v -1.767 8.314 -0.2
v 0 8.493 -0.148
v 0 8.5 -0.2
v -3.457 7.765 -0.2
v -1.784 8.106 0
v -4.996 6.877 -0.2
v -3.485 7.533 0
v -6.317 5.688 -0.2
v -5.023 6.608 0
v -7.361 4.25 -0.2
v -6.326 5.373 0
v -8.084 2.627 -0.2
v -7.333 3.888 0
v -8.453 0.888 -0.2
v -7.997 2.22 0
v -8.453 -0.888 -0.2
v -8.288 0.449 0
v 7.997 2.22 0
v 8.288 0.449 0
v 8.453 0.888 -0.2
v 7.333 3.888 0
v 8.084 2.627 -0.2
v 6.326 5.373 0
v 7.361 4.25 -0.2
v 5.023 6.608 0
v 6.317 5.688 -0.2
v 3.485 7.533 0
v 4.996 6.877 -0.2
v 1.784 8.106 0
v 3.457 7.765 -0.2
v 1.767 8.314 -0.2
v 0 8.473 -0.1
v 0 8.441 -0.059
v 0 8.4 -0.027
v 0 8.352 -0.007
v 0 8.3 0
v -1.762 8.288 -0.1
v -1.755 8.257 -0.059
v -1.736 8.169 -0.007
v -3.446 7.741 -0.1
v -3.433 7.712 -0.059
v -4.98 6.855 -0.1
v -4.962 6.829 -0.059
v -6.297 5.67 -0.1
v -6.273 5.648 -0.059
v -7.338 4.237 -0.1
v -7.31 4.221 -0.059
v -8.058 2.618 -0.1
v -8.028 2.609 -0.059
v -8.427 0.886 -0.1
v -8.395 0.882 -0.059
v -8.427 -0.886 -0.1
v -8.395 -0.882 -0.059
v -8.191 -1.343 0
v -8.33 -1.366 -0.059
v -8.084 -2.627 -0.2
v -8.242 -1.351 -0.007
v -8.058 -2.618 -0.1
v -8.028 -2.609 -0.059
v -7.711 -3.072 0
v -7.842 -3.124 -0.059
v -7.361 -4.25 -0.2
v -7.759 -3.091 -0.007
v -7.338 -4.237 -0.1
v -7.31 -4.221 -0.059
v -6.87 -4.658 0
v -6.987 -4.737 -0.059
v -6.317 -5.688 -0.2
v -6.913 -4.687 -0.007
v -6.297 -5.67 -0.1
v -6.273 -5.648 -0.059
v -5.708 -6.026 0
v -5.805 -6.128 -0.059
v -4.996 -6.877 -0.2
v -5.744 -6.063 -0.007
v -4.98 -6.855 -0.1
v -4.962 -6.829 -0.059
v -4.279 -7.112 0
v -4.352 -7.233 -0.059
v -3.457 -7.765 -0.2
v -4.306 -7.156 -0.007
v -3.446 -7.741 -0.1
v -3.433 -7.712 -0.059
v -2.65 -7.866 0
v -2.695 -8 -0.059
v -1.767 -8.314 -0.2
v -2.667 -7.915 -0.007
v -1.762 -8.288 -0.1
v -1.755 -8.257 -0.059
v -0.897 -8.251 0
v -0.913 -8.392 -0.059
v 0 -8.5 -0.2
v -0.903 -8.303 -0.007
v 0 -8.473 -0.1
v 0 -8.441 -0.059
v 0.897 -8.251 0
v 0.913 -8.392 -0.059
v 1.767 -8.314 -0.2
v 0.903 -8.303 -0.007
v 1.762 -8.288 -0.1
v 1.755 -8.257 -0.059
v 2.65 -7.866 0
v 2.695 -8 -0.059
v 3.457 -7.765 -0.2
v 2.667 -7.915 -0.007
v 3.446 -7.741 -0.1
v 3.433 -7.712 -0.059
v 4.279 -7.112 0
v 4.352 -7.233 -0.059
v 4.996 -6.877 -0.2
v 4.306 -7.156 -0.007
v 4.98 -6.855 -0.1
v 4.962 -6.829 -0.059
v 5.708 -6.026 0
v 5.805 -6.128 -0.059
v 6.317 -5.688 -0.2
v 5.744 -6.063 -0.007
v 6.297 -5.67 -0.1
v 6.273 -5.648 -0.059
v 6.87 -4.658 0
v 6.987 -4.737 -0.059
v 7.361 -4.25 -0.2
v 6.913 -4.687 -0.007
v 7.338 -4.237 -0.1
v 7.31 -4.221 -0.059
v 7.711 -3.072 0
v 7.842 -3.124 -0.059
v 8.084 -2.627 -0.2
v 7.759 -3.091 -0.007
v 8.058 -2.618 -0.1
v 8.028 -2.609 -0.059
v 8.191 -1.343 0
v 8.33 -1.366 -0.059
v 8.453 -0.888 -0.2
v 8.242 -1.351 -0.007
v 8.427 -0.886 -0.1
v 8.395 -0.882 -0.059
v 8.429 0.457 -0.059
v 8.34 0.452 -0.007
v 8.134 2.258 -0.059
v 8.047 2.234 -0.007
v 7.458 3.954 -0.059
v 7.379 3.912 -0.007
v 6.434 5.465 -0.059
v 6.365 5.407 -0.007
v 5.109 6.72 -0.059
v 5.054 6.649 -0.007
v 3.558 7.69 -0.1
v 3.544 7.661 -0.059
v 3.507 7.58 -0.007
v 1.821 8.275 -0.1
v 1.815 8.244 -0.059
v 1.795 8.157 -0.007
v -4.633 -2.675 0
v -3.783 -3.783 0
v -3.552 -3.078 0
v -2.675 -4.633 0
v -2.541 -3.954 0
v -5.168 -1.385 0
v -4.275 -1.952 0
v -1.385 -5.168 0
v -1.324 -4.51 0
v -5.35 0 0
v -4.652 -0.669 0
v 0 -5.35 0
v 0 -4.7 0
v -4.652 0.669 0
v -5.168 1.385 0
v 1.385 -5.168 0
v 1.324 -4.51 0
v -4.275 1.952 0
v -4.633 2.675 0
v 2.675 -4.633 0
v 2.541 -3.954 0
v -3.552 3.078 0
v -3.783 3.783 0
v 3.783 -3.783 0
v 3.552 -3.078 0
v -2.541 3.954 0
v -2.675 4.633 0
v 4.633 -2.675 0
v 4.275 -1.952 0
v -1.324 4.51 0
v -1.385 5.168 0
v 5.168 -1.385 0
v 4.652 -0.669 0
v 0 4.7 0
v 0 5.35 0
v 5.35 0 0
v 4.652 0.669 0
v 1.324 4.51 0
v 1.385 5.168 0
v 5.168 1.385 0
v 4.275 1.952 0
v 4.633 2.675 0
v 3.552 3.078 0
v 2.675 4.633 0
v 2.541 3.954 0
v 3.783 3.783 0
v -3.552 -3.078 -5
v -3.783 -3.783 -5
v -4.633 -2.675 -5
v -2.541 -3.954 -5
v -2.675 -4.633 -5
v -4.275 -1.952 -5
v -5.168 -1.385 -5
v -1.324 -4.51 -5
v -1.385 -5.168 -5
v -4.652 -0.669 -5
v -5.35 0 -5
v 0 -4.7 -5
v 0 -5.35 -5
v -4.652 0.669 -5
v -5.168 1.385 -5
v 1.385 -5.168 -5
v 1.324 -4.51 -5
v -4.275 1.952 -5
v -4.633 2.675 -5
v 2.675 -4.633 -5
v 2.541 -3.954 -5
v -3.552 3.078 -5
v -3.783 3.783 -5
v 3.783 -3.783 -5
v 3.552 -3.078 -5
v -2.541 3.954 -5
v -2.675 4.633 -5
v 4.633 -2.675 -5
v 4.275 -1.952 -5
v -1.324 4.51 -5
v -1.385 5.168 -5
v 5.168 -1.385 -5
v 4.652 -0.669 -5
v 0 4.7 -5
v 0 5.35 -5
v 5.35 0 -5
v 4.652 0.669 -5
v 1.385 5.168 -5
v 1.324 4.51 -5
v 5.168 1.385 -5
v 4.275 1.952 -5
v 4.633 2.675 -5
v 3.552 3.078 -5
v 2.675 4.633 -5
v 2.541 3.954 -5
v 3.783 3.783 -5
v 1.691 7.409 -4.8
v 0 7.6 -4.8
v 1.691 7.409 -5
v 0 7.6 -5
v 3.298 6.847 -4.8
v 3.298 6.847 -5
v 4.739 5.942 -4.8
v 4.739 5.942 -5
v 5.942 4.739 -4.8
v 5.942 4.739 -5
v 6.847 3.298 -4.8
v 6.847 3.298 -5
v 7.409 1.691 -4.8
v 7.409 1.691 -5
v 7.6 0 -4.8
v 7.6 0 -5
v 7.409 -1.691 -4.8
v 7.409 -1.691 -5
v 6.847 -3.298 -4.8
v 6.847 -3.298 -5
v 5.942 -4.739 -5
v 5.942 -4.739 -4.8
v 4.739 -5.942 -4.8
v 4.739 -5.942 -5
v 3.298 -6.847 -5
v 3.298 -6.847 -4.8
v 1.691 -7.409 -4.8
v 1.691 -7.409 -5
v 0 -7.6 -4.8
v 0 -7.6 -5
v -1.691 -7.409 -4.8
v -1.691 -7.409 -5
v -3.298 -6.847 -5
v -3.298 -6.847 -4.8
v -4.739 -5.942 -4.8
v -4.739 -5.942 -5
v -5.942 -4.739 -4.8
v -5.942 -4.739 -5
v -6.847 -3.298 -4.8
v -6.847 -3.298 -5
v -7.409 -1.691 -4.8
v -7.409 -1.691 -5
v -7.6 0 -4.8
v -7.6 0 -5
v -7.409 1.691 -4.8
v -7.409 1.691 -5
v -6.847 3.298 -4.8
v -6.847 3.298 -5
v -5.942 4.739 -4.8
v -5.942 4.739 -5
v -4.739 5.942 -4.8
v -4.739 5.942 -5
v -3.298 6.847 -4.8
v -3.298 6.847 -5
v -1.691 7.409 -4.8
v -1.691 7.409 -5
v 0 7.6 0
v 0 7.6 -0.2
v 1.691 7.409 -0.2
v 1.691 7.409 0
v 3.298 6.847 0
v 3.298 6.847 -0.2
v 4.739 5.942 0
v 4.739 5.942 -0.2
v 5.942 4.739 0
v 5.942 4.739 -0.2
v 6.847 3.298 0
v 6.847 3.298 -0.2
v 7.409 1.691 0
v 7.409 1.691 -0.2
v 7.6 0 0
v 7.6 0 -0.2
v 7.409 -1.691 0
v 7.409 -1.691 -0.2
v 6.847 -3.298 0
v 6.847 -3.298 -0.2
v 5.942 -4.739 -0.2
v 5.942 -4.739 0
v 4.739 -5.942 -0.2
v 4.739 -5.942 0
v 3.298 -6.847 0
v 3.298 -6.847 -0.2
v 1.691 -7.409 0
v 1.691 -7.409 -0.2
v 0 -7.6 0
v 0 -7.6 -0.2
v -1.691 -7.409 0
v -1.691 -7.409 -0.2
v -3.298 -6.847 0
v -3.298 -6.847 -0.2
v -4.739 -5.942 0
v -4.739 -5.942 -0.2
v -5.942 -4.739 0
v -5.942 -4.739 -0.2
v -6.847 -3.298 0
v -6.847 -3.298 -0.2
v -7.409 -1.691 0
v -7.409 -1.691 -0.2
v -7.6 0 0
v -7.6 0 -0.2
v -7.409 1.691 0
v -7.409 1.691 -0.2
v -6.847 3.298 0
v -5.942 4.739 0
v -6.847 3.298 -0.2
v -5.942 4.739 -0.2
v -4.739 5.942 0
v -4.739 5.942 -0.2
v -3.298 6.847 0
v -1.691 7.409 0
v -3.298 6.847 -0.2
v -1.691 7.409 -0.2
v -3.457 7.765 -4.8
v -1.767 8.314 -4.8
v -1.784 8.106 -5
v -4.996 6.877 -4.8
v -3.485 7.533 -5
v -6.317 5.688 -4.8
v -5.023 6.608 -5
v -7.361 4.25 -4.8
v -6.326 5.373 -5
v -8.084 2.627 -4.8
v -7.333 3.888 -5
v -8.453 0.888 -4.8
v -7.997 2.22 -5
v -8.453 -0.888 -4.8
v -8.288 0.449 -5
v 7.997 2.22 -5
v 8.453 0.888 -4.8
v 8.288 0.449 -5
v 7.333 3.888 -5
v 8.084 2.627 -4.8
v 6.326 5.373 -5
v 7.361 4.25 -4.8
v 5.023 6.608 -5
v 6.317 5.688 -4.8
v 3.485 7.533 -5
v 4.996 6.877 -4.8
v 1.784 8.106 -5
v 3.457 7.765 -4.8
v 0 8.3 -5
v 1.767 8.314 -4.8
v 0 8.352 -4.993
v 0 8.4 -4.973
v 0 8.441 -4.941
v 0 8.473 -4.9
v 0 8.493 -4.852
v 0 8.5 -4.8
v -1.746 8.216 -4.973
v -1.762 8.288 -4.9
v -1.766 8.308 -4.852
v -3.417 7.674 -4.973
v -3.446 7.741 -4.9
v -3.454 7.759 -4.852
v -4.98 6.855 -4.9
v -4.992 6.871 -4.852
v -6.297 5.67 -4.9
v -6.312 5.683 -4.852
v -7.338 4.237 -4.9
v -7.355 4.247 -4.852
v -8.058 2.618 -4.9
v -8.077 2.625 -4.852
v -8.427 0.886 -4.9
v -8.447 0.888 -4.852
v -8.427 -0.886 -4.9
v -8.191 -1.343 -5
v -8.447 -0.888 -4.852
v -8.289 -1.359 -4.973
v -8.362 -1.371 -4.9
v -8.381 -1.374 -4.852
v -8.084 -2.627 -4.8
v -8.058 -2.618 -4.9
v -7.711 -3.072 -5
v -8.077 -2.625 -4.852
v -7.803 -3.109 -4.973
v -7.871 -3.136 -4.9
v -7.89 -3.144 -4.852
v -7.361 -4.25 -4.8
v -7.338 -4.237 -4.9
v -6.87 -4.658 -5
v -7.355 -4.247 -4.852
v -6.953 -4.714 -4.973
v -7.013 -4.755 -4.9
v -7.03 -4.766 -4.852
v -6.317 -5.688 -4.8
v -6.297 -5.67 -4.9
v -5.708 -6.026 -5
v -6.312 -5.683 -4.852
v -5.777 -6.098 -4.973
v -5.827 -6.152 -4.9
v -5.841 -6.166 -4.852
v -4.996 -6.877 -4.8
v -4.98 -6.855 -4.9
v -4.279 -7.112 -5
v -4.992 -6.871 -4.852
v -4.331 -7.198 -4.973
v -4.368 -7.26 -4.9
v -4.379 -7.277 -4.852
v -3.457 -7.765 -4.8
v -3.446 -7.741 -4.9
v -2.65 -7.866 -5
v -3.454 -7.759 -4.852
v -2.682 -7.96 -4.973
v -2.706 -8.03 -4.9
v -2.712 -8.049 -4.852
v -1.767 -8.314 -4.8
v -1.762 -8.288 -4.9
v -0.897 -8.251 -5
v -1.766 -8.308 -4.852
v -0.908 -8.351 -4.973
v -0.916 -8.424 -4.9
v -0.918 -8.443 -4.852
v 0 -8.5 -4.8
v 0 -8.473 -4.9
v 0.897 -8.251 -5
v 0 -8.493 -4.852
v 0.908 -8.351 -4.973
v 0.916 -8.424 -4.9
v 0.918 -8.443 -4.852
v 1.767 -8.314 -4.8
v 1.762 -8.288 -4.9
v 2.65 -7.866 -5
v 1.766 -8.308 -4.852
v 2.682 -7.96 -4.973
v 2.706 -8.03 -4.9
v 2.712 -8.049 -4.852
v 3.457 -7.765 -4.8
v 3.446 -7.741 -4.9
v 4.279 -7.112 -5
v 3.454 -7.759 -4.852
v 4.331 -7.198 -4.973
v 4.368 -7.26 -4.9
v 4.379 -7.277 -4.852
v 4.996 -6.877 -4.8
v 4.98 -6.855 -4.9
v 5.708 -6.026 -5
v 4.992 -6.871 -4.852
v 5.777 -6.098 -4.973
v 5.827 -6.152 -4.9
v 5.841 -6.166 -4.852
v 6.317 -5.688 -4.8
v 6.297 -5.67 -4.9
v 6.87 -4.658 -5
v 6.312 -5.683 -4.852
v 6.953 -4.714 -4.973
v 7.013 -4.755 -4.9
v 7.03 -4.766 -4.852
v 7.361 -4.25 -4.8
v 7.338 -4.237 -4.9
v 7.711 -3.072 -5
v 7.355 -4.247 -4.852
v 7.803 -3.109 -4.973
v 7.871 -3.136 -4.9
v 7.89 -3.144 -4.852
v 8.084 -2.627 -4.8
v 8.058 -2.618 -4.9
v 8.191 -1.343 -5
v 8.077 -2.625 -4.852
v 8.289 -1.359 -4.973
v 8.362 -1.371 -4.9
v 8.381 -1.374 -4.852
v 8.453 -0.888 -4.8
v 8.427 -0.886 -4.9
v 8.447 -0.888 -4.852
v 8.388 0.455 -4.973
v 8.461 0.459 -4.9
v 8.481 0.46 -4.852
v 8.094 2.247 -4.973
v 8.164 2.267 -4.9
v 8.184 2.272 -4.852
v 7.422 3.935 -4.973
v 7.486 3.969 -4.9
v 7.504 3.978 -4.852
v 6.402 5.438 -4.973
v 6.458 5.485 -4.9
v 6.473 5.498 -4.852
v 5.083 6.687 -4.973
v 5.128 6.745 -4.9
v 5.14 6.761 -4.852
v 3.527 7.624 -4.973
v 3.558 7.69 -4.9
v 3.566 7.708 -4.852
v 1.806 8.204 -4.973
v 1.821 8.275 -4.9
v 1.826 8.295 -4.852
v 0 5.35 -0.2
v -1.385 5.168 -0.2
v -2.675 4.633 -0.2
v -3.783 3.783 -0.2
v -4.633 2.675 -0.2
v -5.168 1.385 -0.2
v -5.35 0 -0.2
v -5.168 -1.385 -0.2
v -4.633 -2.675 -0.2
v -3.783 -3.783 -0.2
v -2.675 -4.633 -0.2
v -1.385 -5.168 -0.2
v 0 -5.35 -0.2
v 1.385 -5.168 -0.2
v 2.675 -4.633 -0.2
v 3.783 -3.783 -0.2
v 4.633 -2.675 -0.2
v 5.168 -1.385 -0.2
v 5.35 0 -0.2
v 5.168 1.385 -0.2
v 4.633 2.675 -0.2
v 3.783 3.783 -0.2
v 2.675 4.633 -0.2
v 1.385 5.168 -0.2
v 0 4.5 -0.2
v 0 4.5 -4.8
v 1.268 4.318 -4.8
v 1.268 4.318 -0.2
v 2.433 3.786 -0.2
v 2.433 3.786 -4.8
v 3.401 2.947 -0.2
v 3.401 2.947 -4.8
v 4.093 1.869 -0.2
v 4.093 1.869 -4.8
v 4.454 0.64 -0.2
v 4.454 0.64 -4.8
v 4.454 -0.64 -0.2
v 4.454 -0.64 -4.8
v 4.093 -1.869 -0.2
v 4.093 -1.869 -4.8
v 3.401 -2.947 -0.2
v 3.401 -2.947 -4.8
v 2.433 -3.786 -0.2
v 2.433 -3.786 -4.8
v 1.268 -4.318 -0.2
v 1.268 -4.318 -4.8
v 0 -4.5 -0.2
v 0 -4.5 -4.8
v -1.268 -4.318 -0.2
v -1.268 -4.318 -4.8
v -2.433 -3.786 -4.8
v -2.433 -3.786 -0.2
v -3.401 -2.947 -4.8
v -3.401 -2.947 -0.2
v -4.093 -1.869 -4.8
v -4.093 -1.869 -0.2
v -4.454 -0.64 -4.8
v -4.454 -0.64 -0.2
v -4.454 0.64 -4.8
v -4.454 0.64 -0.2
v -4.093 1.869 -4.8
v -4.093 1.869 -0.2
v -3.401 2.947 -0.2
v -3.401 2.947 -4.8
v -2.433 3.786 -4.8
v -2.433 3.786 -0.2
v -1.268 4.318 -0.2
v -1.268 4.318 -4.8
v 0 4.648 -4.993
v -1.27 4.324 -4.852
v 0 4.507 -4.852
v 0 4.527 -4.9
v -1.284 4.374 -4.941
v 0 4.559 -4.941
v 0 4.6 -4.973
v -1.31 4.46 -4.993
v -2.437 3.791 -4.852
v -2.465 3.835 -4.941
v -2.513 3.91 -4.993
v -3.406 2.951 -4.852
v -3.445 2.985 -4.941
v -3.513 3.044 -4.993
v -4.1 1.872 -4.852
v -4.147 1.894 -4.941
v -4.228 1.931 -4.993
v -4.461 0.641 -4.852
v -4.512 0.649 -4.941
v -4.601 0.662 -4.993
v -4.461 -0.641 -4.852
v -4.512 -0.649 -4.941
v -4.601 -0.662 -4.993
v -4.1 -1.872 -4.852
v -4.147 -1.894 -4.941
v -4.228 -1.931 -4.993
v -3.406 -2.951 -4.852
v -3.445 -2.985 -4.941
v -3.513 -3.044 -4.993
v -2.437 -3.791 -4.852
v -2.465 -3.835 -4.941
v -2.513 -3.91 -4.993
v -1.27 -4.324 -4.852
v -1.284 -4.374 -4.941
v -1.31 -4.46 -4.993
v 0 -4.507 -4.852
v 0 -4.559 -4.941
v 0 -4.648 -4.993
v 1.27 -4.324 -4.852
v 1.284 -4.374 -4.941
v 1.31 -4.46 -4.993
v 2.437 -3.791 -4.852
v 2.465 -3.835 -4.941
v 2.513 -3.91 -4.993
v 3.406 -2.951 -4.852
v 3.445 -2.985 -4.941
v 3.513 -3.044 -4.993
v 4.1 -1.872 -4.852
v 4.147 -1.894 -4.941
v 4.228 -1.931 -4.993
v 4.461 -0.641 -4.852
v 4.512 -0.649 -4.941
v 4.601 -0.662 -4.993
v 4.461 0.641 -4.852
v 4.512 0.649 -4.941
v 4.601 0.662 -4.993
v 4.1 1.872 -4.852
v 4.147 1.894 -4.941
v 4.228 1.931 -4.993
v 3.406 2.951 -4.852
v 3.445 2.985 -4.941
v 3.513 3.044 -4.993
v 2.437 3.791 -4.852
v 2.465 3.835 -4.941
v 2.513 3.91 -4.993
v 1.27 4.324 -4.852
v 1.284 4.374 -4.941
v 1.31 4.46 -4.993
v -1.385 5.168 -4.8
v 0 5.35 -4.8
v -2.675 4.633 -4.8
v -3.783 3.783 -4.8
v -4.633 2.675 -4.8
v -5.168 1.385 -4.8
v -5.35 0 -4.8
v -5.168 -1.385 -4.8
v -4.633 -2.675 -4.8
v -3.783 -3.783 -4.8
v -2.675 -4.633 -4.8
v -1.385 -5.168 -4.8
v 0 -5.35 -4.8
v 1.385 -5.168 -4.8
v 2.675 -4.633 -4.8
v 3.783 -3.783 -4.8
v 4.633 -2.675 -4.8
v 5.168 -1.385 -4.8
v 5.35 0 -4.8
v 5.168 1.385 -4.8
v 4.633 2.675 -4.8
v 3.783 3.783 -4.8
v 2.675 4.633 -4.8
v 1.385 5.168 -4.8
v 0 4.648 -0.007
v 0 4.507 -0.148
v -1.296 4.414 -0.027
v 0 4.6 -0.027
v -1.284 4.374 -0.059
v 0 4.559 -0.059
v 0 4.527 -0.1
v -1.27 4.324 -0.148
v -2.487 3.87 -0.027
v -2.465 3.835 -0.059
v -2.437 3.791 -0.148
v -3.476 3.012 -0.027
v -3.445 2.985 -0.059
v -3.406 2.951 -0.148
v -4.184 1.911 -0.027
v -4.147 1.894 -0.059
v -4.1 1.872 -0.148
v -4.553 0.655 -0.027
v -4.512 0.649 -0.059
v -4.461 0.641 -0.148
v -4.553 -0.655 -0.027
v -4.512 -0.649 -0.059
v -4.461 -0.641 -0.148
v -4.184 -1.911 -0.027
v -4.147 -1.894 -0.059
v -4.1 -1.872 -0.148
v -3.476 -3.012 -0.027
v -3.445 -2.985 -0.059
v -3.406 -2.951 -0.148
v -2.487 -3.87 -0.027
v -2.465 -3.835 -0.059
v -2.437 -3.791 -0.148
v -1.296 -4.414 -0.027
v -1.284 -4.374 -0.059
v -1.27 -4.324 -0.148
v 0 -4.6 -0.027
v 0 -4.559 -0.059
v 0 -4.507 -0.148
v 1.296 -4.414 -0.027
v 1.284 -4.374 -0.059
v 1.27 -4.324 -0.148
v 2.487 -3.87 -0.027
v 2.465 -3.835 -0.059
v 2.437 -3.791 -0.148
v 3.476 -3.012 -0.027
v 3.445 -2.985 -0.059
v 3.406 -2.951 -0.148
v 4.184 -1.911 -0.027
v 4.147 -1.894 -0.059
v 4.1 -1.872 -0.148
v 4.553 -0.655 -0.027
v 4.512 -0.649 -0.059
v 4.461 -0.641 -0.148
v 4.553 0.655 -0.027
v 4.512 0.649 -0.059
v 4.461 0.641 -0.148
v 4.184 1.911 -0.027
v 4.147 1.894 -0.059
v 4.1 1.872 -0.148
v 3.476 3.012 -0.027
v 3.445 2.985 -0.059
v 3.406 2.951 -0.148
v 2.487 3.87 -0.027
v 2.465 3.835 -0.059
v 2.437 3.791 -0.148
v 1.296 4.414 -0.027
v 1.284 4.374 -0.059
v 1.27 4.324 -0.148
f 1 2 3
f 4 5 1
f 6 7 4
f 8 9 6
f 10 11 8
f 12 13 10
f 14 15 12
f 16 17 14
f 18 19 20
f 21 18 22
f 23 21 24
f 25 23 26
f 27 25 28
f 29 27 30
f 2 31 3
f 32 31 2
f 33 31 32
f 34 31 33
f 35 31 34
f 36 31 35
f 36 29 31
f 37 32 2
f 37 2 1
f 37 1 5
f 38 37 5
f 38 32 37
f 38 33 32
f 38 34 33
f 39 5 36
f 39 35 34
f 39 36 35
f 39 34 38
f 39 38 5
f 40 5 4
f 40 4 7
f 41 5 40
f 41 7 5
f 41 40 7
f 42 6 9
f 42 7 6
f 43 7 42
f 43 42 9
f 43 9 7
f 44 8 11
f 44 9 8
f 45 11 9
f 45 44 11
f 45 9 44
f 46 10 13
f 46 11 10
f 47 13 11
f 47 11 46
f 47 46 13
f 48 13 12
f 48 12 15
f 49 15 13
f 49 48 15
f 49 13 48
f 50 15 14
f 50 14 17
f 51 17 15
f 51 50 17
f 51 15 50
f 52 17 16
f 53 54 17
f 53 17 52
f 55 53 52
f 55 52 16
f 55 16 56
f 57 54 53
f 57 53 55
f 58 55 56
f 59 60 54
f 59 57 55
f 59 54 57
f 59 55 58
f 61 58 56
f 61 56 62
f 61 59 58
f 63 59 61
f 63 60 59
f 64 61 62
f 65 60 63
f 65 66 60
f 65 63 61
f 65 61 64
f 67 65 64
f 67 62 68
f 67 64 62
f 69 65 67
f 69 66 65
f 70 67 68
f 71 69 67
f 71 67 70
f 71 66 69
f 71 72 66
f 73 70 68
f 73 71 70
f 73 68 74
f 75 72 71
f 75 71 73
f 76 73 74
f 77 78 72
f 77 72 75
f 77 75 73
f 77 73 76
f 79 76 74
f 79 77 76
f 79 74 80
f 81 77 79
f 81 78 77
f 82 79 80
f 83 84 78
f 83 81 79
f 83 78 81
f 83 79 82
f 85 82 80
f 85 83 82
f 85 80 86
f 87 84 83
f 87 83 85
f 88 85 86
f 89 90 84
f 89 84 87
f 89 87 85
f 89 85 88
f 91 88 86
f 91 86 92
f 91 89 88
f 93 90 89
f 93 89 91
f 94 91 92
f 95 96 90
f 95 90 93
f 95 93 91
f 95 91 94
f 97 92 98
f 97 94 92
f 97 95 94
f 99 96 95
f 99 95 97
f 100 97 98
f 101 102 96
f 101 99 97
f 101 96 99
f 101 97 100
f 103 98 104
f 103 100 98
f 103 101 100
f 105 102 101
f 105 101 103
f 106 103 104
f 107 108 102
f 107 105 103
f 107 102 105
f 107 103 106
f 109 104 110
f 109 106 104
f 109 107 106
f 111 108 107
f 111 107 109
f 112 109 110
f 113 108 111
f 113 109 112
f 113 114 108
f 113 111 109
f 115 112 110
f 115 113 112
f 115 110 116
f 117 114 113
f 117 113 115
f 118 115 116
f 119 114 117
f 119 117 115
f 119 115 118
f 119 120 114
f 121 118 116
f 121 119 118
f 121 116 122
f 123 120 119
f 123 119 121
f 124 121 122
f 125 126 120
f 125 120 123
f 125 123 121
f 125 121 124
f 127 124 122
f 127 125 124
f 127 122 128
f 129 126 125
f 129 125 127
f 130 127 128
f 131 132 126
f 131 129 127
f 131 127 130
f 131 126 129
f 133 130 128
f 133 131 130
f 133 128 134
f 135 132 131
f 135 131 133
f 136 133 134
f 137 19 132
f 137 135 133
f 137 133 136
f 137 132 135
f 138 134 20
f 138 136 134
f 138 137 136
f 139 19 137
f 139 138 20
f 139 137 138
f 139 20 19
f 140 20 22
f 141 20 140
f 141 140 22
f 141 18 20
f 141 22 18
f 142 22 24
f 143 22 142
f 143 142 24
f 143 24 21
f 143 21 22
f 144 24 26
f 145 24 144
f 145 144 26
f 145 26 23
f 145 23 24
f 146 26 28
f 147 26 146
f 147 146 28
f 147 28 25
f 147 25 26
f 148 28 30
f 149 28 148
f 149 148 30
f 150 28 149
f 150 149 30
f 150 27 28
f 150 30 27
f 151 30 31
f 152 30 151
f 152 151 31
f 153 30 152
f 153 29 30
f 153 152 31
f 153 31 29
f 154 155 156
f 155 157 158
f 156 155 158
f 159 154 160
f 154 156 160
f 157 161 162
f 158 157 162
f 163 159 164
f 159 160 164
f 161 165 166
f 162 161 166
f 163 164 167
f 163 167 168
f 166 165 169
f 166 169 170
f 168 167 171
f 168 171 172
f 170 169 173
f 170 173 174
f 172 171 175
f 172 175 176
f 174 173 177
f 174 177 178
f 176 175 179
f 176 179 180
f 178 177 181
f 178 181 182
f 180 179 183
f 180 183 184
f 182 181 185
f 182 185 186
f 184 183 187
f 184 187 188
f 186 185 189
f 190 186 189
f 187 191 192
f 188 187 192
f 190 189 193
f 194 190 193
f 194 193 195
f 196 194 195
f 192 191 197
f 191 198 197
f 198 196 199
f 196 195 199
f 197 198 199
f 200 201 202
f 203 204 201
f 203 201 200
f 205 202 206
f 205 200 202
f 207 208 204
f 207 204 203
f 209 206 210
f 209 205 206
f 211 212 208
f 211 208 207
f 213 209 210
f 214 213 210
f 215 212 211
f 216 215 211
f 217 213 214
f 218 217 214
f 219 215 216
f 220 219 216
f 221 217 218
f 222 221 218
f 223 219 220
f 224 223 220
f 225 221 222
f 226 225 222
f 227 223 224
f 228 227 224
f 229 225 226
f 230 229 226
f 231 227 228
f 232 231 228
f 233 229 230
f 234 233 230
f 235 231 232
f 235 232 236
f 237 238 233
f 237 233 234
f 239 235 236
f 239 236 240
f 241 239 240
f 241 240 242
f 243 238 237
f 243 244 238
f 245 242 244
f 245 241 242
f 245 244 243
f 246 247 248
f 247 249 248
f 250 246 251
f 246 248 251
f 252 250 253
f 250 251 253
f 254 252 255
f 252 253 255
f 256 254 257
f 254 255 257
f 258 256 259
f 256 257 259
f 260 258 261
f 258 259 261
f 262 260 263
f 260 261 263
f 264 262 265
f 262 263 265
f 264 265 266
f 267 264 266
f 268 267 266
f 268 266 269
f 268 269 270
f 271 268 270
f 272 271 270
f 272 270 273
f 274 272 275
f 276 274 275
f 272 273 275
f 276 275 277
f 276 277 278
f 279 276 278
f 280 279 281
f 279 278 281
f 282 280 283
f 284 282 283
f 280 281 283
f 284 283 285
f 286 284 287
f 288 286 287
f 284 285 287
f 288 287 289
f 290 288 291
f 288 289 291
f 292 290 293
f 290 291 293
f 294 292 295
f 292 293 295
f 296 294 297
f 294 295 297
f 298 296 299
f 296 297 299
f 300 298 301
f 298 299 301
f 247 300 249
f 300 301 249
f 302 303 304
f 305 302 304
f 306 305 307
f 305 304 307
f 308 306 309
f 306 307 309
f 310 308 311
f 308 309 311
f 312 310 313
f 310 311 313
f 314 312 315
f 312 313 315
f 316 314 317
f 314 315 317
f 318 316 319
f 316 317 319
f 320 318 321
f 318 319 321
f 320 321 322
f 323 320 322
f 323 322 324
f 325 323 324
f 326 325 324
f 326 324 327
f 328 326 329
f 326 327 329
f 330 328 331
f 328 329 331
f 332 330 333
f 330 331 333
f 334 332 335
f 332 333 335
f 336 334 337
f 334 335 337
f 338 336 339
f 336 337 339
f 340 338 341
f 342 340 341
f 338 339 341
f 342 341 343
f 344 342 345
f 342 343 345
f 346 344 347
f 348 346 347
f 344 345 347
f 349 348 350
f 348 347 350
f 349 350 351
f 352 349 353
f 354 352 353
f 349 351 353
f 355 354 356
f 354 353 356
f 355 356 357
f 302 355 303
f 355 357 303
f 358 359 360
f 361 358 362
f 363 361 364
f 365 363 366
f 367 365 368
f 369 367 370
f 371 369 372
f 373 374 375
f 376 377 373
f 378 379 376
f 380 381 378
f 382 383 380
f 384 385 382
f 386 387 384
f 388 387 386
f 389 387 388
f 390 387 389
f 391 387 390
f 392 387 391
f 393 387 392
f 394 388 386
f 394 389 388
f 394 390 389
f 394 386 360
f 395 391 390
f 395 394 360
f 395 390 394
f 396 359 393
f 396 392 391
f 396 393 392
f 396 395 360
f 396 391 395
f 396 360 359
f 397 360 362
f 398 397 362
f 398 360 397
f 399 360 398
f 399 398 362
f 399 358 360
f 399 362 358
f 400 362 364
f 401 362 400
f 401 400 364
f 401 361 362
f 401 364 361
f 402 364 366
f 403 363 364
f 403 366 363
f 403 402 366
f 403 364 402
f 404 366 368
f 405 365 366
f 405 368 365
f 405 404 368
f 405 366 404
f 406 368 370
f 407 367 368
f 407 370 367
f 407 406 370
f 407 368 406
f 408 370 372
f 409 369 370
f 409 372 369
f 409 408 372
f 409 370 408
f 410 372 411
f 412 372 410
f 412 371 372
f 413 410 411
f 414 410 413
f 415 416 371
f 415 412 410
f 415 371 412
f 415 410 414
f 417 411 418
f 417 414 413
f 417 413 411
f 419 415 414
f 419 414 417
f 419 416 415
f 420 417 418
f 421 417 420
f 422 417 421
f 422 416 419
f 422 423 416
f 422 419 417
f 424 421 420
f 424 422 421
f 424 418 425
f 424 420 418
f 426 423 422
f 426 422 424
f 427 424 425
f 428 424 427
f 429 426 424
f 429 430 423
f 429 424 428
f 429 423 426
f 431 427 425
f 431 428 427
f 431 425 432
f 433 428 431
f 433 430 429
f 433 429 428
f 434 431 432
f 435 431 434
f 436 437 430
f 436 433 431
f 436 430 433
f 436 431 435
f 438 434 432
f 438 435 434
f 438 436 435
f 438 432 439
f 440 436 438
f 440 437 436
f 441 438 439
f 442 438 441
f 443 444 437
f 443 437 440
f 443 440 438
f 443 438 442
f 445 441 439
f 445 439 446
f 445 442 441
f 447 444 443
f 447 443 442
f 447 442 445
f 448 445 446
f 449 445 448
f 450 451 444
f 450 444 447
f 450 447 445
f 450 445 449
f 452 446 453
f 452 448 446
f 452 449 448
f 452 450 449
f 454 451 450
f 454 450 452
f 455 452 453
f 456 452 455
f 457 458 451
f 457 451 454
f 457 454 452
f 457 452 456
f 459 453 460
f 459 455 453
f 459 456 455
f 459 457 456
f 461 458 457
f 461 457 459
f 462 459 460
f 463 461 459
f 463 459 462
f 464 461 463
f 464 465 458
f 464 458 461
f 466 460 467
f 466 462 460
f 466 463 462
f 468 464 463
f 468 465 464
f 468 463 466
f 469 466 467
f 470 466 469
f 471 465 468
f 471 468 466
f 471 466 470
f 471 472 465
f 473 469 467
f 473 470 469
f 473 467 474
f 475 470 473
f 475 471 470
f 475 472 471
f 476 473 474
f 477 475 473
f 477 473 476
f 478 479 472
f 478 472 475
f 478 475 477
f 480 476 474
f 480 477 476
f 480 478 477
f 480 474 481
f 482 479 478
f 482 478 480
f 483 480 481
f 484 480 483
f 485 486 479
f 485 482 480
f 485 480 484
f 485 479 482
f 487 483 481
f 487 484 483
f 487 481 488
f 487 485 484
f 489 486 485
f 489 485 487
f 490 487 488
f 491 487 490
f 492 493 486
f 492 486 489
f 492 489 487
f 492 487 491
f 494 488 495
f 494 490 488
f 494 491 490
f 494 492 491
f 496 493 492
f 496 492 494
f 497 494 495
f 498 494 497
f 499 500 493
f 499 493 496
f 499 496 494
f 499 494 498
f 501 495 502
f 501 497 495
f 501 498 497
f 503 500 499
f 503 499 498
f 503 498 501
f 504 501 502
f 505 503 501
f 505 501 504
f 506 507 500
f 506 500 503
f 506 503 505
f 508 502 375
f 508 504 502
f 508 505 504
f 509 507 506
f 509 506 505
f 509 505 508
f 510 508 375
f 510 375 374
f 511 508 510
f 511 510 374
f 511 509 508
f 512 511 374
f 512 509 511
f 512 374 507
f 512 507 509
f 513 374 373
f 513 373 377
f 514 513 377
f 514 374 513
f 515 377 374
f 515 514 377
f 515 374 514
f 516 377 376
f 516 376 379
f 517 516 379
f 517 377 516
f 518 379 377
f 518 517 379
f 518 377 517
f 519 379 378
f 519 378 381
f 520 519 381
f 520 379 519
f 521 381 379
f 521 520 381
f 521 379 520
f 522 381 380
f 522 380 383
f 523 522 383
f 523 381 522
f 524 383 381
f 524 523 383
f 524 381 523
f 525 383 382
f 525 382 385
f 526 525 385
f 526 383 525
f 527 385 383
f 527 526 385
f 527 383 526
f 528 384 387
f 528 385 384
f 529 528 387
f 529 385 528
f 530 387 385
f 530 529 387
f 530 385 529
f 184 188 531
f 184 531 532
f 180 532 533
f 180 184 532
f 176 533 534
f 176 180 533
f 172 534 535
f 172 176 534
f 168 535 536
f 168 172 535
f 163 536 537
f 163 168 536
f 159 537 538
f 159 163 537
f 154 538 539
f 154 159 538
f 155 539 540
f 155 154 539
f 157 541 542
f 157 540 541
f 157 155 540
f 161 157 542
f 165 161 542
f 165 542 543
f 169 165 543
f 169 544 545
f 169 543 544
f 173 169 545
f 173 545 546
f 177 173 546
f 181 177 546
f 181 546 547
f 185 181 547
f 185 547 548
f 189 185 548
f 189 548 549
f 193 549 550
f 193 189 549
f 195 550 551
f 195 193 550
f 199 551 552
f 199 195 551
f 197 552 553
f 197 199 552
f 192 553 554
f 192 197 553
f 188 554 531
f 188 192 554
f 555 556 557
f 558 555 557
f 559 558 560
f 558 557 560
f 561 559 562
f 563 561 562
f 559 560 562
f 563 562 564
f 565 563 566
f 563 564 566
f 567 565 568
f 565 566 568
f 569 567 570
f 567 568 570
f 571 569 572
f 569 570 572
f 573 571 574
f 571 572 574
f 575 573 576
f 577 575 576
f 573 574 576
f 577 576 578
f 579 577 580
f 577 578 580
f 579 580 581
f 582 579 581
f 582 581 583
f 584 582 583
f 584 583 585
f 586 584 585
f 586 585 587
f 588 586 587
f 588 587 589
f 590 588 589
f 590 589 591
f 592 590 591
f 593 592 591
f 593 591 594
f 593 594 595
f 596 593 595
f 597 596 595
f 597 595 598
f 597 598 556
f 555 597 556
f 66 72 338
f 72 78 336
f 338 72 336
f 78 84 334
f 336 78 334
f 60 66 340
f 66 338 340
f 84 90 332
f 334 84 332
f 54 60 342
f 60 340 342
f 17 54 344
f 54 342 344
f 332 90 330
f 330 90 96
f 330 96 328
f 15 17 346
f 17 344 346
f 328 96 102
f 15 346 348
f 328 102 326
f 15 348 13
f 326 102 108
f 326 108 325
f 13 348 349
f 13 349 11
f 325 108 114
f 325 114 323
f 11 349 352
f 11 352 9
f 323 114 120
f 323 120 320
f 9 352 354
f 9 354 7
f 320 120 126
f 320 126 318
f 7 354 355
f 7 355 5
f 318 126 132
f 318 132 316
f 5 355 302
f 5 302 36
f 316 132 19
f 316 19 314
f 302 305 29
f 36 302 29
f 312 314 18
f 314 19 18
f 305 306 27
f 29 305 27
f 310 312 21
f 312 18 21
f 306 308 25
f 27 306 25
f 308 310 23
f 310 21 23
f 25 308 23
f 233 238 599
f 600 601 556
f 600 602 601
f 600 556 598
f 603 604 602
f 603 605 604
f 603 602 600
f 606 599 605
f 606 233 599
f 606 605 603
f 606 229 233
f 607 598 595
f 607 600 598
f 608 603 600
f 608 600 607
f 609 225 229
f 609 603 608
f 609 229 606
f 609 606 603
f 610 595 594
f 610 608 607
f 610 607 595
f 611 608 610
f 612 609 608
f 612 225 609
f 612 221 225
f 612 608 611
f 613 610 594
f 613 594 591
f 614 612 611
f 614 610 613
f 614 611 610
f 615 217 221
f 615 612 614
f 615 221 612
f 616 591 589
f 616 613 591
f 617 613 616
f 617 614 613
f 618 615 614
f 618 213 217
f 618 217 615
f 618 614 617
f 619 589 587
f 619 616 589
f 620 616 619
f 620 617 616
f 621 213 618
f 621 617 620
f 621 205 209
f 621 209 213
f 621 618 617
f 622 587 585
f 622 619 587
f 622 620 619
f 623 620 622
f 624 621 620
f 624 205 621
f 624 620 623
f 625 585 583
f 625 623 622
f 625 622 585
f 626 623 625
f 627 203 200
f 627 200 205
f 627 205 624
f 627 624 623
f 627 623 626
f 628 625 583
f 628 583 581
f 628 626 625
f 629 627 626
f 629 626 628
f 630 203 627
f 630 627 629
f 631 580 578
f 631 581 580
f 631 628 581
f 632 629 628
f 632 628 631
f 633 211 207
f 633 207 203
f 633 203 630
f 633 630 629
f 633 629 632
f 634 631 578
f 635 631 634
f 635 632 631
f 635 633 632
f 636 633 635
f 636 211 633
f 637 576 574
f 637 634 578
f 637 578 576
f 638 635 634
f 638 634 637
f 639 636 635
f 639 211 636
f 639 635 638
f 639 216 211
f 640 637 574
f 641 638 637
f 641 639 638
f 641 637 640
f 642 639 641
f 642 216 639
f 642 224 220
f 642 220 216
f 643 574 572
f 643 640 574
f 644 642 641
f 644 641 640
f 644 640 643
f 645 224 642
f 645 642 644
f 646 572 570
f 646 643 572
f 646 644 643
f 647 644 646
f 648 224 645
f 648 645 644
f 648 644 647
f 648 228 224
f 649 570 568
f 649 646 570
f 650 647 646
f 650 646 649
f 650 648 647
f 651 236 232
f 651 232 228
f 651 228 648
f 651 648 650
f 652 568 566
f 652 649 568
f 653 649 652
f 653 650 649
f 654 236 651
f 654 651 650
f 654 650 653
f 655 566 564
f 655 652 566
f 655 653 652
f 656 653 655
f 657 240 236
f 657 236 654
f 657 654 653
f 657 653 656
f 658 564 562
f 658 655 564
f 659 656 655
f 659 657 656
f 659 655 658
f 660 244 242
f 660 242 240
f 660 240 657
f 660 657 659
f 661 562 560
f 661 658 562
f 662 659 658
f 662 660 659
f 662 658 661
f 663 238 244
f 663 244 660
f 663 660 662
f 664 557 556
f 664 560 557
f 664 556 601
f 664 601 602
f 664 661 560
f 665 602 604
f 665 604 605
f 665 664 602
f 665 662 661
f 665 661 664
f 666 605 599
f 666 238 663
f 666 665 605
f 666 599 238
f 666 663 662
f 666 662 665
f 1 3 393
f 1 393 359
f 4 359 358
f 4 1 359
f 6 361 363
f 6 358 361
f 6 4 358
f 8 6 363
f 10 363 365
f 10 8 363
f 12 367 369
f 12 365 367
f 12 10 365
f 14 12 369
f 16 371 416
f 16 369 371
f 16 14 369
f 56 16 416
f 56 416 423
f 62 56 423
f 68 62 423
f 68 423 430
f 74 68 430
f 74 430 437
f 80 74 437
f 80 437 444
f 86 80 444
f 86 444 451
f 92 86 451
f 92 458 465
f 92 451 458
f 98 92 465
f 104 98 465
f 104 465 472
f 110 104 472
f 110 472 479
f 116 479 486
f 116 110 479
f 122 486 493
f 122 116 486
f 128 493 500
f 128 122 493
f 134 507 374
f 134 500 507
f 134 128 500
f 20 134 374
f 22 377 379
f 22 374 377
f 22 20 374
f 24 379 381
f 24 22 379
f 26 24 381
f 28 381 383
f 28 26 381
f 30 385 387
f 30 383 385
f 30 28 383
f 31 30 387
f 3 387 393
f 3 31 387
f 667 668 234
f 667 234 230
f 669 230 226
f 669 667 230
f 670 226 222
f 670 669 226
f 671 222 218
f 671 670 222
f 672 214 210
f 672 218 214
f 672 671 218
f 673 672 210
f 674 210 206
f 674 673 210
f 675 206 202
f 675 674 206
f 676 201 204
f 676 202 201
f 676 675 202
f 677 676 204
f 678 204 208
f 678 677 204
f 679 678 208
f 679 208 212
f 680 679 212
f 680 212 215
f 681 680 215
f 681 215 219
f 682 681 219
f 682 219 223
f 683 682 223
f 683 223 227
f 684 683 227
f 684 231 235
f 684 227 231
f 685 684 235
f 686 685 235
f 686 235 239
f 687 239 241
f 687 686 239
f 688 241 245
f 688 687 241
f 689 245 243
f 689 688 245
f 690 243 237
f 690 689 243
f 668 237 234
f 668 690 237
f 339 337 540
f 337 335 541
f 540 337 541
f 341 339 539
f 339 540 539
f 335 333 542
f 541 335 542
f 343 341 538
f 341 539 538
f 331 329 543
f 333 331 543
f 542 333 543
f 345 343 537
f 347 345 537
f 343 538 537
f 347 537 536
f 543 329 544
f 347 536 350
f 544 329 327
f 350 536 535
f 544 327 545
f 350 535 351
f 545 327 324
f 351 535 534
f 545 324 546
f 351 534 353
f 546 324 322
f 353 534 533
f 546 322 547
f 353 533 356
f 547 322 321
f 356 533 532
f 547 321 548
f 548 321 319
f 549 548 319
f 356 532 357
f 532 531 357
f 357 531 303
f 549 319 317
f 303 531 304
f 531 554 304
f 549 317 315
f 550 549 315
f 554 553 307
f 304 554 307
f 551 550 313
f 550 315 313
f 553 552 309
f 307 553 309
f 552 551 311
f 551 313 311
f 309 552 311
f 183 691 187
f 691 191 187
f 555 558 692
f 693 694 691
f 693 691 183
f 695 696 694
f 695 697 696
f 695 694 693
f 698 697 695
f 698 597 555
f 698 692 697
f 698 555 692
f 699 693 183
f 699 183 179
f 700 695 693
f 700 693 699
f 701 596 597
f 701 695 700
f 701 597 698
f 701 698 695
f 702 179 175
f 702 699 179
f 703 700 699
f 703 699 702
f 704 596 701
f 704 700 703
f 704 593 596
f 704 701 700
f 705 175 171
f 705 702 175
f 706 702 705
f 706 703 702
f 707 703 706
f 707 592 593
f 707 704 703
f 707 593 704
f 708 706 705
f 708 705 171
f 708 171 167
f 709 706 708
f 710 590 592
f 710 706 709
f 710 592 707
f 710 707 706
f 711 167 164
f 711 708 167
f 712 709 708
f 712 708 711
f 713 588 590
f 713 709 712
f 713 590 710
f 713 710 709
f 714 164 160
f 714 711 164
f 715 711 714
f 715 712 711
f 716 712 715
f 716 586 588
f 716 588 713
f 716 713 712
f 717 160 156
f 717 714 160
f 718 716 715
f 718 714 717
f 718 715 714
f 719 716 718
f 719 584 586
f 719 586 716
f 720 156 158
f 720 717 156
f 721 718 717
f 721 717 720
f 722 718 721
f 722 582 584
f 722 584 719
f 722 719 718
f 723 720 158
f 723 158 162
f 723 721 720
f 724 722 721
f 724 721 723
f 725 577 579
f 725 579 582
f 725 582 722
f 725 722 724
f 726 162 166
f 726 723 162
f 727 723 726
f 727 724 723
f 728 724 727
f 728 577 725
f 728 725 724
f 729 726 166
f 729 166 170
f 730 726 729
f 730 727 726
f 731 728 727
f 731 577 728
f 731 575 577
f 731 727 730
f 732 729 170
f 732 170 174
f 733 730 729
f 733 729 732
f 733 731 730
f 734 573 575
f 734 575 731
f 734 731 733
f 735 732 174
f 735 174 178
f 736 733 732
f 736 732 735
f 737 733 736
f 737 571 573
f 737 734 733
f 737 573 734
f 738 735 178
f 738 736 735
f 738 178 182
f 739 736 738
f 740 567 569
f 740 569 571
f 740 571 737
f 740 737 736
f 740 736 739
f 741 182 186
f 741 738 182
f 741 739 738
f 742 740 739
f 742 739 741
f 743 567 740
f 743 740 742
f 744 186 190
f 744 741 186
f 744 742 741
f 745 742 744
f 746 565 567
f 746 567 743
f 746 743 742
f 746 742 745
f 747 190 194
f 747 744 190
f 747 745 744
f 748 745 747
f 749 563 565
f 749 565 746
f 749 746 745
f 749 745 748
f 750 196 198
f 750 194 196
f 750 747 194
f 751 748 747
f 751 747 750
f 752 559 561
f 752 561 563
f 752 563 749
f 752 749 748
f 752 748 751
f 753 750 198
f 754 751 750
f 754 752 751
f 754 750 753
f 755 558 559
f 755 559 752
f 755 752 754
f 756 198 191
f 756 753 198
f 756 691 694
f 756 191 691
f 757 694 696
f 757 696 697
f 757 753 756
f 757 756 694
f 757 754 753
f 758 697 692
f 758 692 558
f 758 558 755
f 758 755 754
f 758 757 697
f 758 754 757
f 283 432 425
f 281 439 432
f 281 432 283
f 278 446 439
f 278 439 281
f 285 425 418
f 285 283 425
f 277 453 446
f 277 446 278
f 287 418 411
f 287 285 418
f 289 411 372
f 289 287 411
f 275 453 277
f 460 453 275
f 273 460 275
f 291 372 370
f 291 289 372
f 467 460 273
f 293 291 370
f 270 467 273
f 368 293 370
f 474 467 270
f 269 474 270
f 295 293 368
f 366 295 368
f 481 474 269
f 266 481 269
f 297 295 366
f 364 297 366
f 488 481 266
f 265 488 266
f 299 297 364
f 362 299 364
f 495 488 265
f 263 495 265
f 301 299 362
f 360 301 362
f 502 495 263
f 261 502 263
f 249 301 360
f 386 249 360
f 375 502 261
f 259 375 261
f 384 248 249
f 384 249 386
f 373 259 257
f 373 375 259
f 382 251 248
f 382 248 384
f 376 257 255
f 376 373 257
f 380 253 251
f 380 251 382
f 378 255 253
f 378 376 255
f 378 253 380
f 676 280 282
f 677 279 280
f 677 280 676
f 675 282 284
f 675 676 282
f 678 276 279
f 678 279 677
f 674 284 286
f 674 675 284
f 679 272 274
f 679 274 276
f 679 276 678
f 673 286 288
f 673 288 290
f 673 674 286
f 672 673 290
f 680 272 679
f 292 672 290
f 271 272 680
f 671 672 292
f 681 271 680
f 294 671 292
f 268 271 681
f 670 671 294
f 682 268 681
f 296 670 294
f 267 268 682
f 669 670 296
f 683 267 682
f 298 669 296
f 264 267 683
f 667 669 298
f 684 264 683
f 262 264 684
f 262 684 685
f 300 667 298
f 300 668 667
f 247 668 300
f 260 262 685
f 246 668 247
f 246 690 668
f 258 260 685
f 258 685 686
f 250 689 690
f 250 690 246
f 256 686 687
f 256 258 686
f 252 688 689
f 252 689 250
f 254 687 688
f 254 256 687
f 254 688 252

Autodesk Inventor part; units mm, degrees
sketch "Sketch_1" plane through (0, 0, 0) normal (1, 0, 0) x (0, 0, -1)
  line L0 (5, 0) -> (0, 0)
  arc A0 (0, 4.7) -> (0.2, 4.5) centre (0.2, 4.7) ccw
  line L1 (0.2, 4.5) -> (4.8, 4.5)
  arc A1 (4.8, 4.5) -> (5, 4.7) centre (4.8, 4.7) ccw
  line L2 (5, 4.7) -> (5, 5.35)
  line L3 (5, 5.35) -> (4.8, 5.35)
  line L4 (4.8, 5.35) -> (4.8, 7.6)
  line L5 (4.8, 7.6) -> (5, 7.6)
  line L6 (5, 7.6) -> (5, 8.3)
  arc A2 (5, 8.3) -> (4.8, 8.5) centre (4.8, 8.3) ccw
  line L7 (4.8, 8.5) -> (0.2, 8.5)
  arc A3 (0.2, 8.5) -> (0, 8.3) centre (0.2, 8.3) ccw
  line L8 (0, 8.3) -> (0, 7.6)
  line L9 (0, 7.6) -> (0.2, 7.6)
  line L10 (0.2, 7.6) -> (0.2, 5.35)
  line L11 (0.2, 5.35) -> (0, 5.35)
  line L12 (0, 5.35) -> (0, 4.7)
revolve "Revolution1" add sketch "Sketch_1" angle 360 about axis through (0, 0, -5) along (0, 0, -1)
ref_plane "to_housing_XY" through (0, 0, 0) normal (0, 0, -1) x (1, 0, 0)
ref_plane "to_housing_YZ" through (0, 0, 0) normal (1, 0, 0) x (0, -1, 0)
ref_plane "to_housing_ZX" through (0, 0, 0) normal (0, -1, 0) x (0, 0, -1)
properties part number "SUTB689ZZ" material "ステンレス鋼"
